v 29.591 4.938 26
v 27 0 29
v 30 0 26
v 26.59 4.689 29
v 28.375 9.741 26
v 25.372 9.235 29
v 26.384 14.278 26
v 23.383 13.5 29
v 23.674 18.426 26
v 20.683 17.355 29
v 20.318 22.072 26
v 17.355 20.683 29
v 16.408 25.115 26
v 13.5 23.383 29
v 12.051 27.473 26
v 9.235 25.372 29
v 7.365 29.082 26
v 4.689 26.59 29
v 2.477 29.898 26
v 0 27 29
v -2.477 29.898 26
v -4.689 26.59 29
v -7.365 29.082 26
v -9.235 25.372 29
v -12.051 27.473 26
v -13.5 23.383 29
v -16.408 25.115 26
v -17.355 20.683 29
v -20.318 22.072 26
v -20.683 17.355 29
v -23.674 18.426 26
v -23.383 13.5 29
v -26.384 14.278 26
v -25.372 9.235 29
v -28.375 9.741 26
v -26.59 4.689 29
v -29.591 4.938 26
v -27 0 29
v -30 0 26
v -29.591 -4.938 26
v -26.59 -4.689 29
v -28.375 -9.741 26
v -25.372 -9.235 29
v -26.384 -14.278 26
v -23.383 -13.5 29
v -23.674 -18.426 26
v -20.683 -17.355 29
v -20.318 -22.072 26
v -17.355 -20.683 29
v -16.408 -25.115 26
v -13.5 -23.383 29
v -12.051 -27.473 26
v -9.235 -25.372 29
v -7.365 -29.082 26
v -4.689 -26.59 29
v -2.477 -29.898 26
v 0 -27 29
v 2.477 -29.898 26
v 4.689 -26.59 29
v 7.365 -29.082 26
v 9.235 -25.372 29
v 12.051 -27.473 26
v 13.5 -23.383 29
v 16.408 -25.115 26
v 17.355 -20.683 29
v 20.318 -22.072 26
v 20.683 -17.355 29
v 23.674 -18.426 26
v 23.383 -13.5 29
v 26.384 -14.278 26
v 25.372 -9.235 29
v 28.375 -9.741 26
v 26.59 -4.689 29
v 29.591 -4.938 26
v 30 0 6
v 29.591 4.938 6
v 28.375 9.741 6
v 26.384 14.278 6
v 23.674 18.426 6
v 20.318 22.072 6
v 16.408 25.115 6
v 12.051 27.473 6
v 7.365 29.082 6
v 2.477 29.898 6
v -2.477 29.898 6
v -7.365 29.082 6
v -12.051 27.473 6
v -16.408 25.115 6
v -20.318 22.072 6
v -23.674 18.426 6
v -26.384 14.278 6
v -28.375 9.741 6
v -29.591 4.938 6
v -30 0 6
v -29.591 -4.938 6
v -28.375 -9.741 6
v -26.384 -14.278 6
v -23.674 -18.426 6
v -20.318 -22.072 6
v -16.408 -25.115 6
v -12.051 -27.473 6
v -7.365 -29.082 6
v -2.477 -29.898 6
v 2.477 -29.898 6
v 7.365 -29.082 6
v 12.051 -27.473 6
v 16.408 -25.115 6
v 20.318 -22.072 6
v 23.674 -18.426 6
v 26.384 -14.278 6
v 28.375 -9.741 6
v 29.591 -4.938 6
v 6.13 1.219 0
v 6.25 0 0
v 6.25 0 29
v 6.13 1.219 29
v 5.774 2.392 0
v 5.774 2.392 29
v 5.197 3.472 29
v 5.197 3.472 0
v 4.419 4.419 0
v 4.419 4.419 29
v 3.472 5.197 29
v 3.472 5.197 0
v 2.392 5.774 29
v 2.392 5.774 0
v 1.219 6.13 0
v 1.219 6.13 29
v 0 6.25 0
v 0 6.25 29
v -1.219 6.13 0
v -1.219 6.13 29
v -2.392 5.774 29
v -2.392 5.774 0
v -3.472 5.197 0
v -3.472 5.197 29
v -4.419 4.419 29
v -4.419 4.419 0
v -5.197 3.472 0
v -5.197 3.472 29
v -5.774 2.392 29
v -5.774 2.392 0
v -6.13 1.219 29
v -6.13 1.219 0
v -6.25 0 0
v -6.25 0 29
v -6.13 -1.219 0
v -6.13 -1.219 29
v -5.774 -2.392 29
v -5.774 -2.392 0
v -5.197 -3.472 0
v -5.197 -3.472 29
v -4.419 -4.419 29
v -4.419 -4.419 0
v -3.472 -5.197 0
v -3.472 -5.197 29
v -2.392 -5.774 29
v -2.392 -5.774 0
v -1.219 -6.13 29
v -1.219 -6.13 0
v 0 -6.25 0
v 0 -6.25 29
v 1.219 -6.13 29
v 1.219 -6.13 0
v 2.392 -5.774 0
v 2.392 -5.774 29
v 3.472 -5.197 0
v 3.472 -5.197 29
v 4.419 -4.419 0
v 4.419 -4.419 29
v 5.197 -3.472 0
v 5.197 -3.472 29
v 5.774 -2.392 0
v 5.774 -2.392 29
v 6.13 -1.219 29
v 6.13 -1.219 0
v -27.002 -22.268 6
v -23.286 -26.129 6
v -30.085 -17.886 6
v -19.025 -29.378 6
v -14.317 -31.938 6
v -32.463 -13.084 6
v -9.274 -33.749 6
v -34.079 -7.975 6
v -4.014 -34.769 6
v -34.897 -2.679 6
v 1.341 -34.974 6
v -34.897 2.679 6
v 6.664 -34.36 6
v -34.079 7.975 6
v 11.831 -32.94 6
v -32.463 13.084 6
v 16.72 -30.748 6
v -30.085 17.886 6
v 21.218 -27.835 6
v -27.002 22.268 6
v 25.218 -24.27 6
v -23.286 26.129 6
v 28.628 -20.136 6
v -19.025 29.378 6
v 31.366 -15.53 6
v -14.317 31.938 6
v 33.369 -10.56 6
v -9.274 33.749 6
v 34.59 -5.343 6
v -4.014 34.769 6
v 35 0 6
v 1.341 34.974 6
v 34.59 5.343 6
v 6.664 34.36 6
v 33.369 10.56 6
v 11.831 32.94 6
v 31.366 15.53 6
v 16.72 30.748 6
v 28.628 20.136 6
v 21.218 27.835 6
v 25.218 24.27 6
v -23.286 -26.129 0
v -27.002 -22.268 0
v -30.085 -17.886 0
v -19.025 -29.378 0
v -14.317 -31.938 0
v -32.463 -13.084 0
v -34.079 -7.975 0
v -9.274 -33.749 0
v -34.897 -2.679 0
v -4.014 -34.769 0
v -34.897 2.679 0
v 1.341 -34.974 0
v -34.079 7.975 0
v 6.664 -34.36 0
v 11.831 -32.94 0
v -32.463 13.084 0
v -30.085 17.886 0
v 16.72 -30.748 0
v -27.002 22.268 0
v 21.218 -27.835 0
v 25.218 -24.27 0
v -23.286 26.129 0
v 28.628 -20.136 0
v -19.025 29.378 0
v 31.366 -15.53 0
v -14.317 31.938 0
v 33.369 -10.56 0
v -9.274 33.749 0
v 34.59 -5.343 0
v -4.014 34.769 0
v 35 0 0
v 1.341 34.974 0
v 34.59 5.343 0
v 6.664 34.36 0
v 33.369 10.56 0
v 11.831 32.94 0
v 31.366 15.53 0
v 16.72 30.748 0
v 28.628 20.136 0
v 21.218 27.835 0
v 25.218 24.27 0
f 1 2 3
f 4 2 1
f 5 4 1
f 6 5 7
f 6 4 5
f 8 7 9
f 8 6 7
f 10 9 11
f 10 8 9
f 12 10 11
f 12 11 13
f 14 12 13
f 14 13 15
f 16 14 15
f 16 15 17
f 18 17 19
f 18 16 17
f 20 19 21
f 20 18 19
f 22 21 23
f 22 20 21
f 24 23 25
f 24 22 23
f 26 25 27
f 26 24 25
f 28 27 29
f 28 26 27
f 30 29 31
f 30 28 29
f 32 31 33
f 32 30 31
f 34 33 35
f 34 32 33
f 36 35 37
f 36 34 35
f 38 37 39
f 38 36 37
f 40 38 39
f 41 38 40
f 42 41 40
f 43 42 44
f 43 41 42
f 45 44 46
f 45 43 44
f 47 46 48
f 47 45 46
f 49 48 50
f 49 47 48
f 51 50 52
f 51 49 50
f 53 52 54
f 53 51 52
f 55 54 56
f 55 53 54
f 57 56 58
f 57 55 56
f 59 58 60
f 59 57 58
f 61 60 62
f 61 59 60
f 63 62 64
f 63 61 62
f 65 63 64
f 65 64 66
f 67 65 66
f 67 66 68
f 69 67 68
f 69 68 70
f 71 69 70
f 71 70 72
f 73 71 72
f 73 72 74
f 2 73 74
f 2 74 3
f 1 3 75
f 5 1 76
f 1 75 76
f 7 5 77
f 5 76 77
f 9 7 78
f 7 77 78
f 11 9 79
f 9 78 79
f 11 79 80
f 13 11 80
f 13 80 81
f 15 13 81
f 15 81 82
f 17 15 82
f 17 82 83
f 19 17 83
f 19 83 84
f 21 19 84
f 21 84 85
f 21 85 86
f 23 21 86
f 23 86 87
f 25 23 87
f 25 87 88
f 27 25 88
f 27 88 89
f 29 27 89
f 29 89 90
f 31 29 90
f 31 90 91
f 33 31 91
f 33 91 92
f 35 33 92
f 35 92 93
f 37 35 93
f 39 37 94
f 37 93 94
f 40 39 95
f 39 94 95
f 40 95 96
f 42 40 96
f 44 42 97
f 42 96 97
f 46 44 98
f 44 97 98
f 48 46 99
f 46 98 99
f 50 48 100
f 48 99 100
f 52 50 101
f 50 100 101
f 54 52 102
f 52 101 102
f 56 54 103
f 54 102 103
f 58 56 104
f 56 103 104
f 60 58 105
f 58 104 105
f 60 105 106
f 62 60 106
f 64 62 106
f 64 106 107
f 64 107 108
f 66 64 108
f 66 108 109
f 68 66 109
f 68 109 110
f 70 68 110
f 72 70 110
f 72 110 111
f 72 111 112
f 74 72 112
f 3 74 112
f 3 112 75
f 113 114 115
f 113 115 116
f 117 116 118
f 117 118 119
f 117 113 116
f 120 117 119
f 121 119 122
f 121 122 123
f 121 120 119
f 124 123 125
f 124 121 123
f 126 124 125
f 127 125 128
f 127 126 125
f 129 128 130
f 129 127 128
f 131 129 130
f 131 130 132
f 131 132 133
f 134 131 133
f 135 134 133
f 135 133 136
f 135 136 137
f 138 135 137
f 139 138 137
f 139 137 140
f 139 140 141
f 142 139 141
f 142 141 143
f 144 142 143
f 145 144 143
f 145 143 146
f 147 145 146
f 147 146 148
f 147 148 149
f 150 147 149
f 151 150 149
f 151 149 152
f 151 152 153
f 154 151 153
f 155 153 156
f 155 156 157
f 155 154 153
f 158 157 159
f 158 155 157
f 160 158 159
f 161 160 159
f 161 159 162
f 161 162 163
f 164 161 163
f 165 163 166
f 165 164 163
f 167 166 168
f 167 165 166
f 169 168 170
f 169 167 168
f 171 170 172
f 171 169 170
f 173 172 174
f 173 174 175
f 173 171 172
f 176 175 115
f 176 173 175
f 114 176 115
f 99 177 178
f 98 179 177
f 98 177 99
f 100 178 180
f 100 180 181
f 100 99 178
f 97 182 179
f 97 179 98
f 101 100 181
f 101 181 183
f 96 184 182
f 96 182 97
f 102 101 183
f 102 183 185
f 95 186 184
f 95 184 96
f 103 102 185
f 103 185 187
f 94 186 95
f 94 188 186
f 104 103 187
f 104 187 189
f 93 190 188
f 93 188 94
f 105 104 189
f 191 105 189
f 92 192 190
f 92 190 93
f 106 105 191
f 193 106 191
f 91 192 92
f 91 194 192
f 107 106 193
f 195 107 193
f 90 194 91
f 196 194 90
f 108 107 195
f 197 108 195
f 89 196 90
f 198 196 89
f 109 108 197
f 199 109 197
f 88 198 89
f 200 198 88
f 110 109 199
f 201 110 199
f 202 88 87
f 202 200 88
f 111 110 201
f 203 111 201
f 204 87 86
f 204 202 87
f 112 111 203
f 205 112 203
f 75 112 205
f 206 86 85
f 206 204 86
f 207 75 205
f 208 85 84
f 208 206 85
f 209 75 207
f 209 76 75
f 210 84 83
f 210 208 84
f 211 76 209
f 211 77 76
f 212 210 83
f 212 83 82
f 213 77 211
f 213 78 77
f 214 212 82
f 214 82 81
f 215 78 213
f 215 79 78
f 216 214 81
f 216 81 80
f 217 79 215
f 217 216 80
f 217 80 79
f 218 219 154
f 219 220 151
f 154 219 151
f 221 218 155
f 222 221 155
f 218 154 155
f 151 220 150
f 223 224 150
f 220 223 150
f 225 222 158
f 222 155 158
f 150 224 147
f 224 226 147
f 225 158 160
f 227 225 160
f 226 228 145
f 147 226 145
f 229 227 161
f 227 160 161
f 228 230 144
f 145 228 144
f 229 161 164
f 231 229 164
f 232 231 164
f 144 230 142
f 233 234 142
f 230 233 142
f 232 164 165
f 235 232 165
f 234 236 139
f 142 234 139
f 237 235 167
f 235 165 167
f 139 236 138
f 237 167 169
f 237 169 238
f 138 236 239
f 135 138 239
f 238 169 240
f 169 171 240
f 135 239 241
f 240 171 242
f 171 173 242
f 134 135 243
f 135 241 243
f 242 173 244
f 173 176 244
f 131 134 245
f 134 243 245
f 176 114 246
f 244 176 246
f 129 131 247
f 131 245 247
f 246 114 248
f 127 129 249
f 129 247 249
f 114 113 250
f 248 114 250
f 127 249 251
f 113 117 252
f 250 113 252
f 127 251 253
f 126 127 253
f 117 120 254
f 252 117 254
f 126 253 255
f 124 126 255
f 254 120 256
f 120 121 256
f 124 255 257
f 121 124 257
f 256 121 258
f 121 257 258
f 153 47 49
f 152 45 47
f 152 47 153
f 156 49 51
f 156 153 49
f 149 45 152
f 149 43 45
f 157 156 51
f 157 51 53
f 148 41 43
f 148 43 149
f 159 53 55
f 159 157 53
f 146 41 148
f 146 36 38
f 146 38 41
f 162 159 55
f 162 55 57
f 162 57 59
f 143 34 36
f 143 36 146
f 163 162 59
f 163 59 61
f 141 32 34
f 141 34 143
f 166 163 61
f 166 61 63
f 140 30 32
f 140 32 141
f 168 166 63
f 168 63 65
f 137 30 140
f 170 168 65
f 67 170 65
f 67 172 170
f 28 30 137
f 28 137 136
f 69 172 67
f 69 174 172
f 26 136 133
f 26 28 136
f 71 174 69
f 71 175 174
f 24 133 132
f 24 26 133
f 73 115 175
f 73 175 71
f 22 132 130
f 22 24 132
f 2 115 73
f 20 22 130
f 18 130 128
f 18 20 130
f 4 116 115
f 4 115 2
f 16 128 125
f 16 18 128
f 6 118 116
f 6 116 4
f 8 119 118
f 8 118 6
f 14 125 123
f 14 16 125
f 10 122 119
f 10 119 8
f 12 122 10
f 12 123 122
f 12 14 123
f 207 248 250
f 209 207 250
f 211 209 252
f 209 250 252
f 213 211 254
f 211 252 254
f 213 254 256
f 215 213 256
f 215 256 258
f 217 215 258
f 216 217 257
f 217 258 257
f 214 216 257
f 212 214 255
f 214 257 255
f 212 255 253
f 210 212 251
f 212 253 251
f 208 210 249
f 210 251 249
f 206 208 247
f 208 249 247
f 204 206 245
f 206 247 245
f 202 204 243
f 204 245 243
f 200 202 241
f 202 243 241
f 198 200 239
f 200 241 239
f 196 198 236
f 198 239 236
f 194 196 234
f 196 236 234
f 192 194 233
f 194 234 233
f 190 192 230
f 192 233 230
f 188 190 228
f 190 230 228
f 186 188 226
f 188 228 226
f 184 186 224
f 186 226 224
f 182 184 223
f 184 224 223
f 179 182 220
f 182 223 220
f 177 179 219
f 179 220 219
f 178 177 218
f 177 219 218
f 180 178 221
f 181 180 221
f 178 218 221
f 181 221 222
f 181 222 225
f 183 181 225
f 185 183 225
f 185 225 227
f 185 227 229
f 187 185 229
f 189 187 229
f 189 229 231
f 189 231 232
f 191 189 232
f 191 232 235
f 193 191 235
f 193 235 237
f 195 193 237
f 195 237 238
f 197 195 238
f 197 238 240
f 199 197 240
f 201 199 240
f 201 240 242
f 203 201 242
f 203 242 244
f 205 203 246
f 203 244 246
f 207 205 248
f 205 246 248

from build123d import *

# Parameters (mm, degrees)
F0_R     = 30
F0_R_2   = 6.25
F1_DEPTH = 29
F2_R     = 35
F2_R_2   = 6.25
F3_DEPTH = 6
F4_SIZE  = 3


with BuildPart() as f1:
    # F0 (on Top) → F1 (new body)
    with BuildSketch(Plane.XY):
        Circle(F0_R)
        Circle(F0_R_2, mode=Mode.SUBTRACT)
    extrude(amount=F1_DEPTH)

    # F2 (on Top) → F3 (join)
    with BuildSketch(Plane.XY):
        Circle(F2_R)
        Circle(F2_R_2, mode=Mode.SUBTRACT)
    extrude(amount=F3_DEPTH)

    # F4
    f4_edges = [f1.edges().sort_by_distance(p)[0] for p in [
        (-30, 0, 29),
    ]]
    chamfer(f4_edges, length=F4_SIZE)


solid = f1.part
